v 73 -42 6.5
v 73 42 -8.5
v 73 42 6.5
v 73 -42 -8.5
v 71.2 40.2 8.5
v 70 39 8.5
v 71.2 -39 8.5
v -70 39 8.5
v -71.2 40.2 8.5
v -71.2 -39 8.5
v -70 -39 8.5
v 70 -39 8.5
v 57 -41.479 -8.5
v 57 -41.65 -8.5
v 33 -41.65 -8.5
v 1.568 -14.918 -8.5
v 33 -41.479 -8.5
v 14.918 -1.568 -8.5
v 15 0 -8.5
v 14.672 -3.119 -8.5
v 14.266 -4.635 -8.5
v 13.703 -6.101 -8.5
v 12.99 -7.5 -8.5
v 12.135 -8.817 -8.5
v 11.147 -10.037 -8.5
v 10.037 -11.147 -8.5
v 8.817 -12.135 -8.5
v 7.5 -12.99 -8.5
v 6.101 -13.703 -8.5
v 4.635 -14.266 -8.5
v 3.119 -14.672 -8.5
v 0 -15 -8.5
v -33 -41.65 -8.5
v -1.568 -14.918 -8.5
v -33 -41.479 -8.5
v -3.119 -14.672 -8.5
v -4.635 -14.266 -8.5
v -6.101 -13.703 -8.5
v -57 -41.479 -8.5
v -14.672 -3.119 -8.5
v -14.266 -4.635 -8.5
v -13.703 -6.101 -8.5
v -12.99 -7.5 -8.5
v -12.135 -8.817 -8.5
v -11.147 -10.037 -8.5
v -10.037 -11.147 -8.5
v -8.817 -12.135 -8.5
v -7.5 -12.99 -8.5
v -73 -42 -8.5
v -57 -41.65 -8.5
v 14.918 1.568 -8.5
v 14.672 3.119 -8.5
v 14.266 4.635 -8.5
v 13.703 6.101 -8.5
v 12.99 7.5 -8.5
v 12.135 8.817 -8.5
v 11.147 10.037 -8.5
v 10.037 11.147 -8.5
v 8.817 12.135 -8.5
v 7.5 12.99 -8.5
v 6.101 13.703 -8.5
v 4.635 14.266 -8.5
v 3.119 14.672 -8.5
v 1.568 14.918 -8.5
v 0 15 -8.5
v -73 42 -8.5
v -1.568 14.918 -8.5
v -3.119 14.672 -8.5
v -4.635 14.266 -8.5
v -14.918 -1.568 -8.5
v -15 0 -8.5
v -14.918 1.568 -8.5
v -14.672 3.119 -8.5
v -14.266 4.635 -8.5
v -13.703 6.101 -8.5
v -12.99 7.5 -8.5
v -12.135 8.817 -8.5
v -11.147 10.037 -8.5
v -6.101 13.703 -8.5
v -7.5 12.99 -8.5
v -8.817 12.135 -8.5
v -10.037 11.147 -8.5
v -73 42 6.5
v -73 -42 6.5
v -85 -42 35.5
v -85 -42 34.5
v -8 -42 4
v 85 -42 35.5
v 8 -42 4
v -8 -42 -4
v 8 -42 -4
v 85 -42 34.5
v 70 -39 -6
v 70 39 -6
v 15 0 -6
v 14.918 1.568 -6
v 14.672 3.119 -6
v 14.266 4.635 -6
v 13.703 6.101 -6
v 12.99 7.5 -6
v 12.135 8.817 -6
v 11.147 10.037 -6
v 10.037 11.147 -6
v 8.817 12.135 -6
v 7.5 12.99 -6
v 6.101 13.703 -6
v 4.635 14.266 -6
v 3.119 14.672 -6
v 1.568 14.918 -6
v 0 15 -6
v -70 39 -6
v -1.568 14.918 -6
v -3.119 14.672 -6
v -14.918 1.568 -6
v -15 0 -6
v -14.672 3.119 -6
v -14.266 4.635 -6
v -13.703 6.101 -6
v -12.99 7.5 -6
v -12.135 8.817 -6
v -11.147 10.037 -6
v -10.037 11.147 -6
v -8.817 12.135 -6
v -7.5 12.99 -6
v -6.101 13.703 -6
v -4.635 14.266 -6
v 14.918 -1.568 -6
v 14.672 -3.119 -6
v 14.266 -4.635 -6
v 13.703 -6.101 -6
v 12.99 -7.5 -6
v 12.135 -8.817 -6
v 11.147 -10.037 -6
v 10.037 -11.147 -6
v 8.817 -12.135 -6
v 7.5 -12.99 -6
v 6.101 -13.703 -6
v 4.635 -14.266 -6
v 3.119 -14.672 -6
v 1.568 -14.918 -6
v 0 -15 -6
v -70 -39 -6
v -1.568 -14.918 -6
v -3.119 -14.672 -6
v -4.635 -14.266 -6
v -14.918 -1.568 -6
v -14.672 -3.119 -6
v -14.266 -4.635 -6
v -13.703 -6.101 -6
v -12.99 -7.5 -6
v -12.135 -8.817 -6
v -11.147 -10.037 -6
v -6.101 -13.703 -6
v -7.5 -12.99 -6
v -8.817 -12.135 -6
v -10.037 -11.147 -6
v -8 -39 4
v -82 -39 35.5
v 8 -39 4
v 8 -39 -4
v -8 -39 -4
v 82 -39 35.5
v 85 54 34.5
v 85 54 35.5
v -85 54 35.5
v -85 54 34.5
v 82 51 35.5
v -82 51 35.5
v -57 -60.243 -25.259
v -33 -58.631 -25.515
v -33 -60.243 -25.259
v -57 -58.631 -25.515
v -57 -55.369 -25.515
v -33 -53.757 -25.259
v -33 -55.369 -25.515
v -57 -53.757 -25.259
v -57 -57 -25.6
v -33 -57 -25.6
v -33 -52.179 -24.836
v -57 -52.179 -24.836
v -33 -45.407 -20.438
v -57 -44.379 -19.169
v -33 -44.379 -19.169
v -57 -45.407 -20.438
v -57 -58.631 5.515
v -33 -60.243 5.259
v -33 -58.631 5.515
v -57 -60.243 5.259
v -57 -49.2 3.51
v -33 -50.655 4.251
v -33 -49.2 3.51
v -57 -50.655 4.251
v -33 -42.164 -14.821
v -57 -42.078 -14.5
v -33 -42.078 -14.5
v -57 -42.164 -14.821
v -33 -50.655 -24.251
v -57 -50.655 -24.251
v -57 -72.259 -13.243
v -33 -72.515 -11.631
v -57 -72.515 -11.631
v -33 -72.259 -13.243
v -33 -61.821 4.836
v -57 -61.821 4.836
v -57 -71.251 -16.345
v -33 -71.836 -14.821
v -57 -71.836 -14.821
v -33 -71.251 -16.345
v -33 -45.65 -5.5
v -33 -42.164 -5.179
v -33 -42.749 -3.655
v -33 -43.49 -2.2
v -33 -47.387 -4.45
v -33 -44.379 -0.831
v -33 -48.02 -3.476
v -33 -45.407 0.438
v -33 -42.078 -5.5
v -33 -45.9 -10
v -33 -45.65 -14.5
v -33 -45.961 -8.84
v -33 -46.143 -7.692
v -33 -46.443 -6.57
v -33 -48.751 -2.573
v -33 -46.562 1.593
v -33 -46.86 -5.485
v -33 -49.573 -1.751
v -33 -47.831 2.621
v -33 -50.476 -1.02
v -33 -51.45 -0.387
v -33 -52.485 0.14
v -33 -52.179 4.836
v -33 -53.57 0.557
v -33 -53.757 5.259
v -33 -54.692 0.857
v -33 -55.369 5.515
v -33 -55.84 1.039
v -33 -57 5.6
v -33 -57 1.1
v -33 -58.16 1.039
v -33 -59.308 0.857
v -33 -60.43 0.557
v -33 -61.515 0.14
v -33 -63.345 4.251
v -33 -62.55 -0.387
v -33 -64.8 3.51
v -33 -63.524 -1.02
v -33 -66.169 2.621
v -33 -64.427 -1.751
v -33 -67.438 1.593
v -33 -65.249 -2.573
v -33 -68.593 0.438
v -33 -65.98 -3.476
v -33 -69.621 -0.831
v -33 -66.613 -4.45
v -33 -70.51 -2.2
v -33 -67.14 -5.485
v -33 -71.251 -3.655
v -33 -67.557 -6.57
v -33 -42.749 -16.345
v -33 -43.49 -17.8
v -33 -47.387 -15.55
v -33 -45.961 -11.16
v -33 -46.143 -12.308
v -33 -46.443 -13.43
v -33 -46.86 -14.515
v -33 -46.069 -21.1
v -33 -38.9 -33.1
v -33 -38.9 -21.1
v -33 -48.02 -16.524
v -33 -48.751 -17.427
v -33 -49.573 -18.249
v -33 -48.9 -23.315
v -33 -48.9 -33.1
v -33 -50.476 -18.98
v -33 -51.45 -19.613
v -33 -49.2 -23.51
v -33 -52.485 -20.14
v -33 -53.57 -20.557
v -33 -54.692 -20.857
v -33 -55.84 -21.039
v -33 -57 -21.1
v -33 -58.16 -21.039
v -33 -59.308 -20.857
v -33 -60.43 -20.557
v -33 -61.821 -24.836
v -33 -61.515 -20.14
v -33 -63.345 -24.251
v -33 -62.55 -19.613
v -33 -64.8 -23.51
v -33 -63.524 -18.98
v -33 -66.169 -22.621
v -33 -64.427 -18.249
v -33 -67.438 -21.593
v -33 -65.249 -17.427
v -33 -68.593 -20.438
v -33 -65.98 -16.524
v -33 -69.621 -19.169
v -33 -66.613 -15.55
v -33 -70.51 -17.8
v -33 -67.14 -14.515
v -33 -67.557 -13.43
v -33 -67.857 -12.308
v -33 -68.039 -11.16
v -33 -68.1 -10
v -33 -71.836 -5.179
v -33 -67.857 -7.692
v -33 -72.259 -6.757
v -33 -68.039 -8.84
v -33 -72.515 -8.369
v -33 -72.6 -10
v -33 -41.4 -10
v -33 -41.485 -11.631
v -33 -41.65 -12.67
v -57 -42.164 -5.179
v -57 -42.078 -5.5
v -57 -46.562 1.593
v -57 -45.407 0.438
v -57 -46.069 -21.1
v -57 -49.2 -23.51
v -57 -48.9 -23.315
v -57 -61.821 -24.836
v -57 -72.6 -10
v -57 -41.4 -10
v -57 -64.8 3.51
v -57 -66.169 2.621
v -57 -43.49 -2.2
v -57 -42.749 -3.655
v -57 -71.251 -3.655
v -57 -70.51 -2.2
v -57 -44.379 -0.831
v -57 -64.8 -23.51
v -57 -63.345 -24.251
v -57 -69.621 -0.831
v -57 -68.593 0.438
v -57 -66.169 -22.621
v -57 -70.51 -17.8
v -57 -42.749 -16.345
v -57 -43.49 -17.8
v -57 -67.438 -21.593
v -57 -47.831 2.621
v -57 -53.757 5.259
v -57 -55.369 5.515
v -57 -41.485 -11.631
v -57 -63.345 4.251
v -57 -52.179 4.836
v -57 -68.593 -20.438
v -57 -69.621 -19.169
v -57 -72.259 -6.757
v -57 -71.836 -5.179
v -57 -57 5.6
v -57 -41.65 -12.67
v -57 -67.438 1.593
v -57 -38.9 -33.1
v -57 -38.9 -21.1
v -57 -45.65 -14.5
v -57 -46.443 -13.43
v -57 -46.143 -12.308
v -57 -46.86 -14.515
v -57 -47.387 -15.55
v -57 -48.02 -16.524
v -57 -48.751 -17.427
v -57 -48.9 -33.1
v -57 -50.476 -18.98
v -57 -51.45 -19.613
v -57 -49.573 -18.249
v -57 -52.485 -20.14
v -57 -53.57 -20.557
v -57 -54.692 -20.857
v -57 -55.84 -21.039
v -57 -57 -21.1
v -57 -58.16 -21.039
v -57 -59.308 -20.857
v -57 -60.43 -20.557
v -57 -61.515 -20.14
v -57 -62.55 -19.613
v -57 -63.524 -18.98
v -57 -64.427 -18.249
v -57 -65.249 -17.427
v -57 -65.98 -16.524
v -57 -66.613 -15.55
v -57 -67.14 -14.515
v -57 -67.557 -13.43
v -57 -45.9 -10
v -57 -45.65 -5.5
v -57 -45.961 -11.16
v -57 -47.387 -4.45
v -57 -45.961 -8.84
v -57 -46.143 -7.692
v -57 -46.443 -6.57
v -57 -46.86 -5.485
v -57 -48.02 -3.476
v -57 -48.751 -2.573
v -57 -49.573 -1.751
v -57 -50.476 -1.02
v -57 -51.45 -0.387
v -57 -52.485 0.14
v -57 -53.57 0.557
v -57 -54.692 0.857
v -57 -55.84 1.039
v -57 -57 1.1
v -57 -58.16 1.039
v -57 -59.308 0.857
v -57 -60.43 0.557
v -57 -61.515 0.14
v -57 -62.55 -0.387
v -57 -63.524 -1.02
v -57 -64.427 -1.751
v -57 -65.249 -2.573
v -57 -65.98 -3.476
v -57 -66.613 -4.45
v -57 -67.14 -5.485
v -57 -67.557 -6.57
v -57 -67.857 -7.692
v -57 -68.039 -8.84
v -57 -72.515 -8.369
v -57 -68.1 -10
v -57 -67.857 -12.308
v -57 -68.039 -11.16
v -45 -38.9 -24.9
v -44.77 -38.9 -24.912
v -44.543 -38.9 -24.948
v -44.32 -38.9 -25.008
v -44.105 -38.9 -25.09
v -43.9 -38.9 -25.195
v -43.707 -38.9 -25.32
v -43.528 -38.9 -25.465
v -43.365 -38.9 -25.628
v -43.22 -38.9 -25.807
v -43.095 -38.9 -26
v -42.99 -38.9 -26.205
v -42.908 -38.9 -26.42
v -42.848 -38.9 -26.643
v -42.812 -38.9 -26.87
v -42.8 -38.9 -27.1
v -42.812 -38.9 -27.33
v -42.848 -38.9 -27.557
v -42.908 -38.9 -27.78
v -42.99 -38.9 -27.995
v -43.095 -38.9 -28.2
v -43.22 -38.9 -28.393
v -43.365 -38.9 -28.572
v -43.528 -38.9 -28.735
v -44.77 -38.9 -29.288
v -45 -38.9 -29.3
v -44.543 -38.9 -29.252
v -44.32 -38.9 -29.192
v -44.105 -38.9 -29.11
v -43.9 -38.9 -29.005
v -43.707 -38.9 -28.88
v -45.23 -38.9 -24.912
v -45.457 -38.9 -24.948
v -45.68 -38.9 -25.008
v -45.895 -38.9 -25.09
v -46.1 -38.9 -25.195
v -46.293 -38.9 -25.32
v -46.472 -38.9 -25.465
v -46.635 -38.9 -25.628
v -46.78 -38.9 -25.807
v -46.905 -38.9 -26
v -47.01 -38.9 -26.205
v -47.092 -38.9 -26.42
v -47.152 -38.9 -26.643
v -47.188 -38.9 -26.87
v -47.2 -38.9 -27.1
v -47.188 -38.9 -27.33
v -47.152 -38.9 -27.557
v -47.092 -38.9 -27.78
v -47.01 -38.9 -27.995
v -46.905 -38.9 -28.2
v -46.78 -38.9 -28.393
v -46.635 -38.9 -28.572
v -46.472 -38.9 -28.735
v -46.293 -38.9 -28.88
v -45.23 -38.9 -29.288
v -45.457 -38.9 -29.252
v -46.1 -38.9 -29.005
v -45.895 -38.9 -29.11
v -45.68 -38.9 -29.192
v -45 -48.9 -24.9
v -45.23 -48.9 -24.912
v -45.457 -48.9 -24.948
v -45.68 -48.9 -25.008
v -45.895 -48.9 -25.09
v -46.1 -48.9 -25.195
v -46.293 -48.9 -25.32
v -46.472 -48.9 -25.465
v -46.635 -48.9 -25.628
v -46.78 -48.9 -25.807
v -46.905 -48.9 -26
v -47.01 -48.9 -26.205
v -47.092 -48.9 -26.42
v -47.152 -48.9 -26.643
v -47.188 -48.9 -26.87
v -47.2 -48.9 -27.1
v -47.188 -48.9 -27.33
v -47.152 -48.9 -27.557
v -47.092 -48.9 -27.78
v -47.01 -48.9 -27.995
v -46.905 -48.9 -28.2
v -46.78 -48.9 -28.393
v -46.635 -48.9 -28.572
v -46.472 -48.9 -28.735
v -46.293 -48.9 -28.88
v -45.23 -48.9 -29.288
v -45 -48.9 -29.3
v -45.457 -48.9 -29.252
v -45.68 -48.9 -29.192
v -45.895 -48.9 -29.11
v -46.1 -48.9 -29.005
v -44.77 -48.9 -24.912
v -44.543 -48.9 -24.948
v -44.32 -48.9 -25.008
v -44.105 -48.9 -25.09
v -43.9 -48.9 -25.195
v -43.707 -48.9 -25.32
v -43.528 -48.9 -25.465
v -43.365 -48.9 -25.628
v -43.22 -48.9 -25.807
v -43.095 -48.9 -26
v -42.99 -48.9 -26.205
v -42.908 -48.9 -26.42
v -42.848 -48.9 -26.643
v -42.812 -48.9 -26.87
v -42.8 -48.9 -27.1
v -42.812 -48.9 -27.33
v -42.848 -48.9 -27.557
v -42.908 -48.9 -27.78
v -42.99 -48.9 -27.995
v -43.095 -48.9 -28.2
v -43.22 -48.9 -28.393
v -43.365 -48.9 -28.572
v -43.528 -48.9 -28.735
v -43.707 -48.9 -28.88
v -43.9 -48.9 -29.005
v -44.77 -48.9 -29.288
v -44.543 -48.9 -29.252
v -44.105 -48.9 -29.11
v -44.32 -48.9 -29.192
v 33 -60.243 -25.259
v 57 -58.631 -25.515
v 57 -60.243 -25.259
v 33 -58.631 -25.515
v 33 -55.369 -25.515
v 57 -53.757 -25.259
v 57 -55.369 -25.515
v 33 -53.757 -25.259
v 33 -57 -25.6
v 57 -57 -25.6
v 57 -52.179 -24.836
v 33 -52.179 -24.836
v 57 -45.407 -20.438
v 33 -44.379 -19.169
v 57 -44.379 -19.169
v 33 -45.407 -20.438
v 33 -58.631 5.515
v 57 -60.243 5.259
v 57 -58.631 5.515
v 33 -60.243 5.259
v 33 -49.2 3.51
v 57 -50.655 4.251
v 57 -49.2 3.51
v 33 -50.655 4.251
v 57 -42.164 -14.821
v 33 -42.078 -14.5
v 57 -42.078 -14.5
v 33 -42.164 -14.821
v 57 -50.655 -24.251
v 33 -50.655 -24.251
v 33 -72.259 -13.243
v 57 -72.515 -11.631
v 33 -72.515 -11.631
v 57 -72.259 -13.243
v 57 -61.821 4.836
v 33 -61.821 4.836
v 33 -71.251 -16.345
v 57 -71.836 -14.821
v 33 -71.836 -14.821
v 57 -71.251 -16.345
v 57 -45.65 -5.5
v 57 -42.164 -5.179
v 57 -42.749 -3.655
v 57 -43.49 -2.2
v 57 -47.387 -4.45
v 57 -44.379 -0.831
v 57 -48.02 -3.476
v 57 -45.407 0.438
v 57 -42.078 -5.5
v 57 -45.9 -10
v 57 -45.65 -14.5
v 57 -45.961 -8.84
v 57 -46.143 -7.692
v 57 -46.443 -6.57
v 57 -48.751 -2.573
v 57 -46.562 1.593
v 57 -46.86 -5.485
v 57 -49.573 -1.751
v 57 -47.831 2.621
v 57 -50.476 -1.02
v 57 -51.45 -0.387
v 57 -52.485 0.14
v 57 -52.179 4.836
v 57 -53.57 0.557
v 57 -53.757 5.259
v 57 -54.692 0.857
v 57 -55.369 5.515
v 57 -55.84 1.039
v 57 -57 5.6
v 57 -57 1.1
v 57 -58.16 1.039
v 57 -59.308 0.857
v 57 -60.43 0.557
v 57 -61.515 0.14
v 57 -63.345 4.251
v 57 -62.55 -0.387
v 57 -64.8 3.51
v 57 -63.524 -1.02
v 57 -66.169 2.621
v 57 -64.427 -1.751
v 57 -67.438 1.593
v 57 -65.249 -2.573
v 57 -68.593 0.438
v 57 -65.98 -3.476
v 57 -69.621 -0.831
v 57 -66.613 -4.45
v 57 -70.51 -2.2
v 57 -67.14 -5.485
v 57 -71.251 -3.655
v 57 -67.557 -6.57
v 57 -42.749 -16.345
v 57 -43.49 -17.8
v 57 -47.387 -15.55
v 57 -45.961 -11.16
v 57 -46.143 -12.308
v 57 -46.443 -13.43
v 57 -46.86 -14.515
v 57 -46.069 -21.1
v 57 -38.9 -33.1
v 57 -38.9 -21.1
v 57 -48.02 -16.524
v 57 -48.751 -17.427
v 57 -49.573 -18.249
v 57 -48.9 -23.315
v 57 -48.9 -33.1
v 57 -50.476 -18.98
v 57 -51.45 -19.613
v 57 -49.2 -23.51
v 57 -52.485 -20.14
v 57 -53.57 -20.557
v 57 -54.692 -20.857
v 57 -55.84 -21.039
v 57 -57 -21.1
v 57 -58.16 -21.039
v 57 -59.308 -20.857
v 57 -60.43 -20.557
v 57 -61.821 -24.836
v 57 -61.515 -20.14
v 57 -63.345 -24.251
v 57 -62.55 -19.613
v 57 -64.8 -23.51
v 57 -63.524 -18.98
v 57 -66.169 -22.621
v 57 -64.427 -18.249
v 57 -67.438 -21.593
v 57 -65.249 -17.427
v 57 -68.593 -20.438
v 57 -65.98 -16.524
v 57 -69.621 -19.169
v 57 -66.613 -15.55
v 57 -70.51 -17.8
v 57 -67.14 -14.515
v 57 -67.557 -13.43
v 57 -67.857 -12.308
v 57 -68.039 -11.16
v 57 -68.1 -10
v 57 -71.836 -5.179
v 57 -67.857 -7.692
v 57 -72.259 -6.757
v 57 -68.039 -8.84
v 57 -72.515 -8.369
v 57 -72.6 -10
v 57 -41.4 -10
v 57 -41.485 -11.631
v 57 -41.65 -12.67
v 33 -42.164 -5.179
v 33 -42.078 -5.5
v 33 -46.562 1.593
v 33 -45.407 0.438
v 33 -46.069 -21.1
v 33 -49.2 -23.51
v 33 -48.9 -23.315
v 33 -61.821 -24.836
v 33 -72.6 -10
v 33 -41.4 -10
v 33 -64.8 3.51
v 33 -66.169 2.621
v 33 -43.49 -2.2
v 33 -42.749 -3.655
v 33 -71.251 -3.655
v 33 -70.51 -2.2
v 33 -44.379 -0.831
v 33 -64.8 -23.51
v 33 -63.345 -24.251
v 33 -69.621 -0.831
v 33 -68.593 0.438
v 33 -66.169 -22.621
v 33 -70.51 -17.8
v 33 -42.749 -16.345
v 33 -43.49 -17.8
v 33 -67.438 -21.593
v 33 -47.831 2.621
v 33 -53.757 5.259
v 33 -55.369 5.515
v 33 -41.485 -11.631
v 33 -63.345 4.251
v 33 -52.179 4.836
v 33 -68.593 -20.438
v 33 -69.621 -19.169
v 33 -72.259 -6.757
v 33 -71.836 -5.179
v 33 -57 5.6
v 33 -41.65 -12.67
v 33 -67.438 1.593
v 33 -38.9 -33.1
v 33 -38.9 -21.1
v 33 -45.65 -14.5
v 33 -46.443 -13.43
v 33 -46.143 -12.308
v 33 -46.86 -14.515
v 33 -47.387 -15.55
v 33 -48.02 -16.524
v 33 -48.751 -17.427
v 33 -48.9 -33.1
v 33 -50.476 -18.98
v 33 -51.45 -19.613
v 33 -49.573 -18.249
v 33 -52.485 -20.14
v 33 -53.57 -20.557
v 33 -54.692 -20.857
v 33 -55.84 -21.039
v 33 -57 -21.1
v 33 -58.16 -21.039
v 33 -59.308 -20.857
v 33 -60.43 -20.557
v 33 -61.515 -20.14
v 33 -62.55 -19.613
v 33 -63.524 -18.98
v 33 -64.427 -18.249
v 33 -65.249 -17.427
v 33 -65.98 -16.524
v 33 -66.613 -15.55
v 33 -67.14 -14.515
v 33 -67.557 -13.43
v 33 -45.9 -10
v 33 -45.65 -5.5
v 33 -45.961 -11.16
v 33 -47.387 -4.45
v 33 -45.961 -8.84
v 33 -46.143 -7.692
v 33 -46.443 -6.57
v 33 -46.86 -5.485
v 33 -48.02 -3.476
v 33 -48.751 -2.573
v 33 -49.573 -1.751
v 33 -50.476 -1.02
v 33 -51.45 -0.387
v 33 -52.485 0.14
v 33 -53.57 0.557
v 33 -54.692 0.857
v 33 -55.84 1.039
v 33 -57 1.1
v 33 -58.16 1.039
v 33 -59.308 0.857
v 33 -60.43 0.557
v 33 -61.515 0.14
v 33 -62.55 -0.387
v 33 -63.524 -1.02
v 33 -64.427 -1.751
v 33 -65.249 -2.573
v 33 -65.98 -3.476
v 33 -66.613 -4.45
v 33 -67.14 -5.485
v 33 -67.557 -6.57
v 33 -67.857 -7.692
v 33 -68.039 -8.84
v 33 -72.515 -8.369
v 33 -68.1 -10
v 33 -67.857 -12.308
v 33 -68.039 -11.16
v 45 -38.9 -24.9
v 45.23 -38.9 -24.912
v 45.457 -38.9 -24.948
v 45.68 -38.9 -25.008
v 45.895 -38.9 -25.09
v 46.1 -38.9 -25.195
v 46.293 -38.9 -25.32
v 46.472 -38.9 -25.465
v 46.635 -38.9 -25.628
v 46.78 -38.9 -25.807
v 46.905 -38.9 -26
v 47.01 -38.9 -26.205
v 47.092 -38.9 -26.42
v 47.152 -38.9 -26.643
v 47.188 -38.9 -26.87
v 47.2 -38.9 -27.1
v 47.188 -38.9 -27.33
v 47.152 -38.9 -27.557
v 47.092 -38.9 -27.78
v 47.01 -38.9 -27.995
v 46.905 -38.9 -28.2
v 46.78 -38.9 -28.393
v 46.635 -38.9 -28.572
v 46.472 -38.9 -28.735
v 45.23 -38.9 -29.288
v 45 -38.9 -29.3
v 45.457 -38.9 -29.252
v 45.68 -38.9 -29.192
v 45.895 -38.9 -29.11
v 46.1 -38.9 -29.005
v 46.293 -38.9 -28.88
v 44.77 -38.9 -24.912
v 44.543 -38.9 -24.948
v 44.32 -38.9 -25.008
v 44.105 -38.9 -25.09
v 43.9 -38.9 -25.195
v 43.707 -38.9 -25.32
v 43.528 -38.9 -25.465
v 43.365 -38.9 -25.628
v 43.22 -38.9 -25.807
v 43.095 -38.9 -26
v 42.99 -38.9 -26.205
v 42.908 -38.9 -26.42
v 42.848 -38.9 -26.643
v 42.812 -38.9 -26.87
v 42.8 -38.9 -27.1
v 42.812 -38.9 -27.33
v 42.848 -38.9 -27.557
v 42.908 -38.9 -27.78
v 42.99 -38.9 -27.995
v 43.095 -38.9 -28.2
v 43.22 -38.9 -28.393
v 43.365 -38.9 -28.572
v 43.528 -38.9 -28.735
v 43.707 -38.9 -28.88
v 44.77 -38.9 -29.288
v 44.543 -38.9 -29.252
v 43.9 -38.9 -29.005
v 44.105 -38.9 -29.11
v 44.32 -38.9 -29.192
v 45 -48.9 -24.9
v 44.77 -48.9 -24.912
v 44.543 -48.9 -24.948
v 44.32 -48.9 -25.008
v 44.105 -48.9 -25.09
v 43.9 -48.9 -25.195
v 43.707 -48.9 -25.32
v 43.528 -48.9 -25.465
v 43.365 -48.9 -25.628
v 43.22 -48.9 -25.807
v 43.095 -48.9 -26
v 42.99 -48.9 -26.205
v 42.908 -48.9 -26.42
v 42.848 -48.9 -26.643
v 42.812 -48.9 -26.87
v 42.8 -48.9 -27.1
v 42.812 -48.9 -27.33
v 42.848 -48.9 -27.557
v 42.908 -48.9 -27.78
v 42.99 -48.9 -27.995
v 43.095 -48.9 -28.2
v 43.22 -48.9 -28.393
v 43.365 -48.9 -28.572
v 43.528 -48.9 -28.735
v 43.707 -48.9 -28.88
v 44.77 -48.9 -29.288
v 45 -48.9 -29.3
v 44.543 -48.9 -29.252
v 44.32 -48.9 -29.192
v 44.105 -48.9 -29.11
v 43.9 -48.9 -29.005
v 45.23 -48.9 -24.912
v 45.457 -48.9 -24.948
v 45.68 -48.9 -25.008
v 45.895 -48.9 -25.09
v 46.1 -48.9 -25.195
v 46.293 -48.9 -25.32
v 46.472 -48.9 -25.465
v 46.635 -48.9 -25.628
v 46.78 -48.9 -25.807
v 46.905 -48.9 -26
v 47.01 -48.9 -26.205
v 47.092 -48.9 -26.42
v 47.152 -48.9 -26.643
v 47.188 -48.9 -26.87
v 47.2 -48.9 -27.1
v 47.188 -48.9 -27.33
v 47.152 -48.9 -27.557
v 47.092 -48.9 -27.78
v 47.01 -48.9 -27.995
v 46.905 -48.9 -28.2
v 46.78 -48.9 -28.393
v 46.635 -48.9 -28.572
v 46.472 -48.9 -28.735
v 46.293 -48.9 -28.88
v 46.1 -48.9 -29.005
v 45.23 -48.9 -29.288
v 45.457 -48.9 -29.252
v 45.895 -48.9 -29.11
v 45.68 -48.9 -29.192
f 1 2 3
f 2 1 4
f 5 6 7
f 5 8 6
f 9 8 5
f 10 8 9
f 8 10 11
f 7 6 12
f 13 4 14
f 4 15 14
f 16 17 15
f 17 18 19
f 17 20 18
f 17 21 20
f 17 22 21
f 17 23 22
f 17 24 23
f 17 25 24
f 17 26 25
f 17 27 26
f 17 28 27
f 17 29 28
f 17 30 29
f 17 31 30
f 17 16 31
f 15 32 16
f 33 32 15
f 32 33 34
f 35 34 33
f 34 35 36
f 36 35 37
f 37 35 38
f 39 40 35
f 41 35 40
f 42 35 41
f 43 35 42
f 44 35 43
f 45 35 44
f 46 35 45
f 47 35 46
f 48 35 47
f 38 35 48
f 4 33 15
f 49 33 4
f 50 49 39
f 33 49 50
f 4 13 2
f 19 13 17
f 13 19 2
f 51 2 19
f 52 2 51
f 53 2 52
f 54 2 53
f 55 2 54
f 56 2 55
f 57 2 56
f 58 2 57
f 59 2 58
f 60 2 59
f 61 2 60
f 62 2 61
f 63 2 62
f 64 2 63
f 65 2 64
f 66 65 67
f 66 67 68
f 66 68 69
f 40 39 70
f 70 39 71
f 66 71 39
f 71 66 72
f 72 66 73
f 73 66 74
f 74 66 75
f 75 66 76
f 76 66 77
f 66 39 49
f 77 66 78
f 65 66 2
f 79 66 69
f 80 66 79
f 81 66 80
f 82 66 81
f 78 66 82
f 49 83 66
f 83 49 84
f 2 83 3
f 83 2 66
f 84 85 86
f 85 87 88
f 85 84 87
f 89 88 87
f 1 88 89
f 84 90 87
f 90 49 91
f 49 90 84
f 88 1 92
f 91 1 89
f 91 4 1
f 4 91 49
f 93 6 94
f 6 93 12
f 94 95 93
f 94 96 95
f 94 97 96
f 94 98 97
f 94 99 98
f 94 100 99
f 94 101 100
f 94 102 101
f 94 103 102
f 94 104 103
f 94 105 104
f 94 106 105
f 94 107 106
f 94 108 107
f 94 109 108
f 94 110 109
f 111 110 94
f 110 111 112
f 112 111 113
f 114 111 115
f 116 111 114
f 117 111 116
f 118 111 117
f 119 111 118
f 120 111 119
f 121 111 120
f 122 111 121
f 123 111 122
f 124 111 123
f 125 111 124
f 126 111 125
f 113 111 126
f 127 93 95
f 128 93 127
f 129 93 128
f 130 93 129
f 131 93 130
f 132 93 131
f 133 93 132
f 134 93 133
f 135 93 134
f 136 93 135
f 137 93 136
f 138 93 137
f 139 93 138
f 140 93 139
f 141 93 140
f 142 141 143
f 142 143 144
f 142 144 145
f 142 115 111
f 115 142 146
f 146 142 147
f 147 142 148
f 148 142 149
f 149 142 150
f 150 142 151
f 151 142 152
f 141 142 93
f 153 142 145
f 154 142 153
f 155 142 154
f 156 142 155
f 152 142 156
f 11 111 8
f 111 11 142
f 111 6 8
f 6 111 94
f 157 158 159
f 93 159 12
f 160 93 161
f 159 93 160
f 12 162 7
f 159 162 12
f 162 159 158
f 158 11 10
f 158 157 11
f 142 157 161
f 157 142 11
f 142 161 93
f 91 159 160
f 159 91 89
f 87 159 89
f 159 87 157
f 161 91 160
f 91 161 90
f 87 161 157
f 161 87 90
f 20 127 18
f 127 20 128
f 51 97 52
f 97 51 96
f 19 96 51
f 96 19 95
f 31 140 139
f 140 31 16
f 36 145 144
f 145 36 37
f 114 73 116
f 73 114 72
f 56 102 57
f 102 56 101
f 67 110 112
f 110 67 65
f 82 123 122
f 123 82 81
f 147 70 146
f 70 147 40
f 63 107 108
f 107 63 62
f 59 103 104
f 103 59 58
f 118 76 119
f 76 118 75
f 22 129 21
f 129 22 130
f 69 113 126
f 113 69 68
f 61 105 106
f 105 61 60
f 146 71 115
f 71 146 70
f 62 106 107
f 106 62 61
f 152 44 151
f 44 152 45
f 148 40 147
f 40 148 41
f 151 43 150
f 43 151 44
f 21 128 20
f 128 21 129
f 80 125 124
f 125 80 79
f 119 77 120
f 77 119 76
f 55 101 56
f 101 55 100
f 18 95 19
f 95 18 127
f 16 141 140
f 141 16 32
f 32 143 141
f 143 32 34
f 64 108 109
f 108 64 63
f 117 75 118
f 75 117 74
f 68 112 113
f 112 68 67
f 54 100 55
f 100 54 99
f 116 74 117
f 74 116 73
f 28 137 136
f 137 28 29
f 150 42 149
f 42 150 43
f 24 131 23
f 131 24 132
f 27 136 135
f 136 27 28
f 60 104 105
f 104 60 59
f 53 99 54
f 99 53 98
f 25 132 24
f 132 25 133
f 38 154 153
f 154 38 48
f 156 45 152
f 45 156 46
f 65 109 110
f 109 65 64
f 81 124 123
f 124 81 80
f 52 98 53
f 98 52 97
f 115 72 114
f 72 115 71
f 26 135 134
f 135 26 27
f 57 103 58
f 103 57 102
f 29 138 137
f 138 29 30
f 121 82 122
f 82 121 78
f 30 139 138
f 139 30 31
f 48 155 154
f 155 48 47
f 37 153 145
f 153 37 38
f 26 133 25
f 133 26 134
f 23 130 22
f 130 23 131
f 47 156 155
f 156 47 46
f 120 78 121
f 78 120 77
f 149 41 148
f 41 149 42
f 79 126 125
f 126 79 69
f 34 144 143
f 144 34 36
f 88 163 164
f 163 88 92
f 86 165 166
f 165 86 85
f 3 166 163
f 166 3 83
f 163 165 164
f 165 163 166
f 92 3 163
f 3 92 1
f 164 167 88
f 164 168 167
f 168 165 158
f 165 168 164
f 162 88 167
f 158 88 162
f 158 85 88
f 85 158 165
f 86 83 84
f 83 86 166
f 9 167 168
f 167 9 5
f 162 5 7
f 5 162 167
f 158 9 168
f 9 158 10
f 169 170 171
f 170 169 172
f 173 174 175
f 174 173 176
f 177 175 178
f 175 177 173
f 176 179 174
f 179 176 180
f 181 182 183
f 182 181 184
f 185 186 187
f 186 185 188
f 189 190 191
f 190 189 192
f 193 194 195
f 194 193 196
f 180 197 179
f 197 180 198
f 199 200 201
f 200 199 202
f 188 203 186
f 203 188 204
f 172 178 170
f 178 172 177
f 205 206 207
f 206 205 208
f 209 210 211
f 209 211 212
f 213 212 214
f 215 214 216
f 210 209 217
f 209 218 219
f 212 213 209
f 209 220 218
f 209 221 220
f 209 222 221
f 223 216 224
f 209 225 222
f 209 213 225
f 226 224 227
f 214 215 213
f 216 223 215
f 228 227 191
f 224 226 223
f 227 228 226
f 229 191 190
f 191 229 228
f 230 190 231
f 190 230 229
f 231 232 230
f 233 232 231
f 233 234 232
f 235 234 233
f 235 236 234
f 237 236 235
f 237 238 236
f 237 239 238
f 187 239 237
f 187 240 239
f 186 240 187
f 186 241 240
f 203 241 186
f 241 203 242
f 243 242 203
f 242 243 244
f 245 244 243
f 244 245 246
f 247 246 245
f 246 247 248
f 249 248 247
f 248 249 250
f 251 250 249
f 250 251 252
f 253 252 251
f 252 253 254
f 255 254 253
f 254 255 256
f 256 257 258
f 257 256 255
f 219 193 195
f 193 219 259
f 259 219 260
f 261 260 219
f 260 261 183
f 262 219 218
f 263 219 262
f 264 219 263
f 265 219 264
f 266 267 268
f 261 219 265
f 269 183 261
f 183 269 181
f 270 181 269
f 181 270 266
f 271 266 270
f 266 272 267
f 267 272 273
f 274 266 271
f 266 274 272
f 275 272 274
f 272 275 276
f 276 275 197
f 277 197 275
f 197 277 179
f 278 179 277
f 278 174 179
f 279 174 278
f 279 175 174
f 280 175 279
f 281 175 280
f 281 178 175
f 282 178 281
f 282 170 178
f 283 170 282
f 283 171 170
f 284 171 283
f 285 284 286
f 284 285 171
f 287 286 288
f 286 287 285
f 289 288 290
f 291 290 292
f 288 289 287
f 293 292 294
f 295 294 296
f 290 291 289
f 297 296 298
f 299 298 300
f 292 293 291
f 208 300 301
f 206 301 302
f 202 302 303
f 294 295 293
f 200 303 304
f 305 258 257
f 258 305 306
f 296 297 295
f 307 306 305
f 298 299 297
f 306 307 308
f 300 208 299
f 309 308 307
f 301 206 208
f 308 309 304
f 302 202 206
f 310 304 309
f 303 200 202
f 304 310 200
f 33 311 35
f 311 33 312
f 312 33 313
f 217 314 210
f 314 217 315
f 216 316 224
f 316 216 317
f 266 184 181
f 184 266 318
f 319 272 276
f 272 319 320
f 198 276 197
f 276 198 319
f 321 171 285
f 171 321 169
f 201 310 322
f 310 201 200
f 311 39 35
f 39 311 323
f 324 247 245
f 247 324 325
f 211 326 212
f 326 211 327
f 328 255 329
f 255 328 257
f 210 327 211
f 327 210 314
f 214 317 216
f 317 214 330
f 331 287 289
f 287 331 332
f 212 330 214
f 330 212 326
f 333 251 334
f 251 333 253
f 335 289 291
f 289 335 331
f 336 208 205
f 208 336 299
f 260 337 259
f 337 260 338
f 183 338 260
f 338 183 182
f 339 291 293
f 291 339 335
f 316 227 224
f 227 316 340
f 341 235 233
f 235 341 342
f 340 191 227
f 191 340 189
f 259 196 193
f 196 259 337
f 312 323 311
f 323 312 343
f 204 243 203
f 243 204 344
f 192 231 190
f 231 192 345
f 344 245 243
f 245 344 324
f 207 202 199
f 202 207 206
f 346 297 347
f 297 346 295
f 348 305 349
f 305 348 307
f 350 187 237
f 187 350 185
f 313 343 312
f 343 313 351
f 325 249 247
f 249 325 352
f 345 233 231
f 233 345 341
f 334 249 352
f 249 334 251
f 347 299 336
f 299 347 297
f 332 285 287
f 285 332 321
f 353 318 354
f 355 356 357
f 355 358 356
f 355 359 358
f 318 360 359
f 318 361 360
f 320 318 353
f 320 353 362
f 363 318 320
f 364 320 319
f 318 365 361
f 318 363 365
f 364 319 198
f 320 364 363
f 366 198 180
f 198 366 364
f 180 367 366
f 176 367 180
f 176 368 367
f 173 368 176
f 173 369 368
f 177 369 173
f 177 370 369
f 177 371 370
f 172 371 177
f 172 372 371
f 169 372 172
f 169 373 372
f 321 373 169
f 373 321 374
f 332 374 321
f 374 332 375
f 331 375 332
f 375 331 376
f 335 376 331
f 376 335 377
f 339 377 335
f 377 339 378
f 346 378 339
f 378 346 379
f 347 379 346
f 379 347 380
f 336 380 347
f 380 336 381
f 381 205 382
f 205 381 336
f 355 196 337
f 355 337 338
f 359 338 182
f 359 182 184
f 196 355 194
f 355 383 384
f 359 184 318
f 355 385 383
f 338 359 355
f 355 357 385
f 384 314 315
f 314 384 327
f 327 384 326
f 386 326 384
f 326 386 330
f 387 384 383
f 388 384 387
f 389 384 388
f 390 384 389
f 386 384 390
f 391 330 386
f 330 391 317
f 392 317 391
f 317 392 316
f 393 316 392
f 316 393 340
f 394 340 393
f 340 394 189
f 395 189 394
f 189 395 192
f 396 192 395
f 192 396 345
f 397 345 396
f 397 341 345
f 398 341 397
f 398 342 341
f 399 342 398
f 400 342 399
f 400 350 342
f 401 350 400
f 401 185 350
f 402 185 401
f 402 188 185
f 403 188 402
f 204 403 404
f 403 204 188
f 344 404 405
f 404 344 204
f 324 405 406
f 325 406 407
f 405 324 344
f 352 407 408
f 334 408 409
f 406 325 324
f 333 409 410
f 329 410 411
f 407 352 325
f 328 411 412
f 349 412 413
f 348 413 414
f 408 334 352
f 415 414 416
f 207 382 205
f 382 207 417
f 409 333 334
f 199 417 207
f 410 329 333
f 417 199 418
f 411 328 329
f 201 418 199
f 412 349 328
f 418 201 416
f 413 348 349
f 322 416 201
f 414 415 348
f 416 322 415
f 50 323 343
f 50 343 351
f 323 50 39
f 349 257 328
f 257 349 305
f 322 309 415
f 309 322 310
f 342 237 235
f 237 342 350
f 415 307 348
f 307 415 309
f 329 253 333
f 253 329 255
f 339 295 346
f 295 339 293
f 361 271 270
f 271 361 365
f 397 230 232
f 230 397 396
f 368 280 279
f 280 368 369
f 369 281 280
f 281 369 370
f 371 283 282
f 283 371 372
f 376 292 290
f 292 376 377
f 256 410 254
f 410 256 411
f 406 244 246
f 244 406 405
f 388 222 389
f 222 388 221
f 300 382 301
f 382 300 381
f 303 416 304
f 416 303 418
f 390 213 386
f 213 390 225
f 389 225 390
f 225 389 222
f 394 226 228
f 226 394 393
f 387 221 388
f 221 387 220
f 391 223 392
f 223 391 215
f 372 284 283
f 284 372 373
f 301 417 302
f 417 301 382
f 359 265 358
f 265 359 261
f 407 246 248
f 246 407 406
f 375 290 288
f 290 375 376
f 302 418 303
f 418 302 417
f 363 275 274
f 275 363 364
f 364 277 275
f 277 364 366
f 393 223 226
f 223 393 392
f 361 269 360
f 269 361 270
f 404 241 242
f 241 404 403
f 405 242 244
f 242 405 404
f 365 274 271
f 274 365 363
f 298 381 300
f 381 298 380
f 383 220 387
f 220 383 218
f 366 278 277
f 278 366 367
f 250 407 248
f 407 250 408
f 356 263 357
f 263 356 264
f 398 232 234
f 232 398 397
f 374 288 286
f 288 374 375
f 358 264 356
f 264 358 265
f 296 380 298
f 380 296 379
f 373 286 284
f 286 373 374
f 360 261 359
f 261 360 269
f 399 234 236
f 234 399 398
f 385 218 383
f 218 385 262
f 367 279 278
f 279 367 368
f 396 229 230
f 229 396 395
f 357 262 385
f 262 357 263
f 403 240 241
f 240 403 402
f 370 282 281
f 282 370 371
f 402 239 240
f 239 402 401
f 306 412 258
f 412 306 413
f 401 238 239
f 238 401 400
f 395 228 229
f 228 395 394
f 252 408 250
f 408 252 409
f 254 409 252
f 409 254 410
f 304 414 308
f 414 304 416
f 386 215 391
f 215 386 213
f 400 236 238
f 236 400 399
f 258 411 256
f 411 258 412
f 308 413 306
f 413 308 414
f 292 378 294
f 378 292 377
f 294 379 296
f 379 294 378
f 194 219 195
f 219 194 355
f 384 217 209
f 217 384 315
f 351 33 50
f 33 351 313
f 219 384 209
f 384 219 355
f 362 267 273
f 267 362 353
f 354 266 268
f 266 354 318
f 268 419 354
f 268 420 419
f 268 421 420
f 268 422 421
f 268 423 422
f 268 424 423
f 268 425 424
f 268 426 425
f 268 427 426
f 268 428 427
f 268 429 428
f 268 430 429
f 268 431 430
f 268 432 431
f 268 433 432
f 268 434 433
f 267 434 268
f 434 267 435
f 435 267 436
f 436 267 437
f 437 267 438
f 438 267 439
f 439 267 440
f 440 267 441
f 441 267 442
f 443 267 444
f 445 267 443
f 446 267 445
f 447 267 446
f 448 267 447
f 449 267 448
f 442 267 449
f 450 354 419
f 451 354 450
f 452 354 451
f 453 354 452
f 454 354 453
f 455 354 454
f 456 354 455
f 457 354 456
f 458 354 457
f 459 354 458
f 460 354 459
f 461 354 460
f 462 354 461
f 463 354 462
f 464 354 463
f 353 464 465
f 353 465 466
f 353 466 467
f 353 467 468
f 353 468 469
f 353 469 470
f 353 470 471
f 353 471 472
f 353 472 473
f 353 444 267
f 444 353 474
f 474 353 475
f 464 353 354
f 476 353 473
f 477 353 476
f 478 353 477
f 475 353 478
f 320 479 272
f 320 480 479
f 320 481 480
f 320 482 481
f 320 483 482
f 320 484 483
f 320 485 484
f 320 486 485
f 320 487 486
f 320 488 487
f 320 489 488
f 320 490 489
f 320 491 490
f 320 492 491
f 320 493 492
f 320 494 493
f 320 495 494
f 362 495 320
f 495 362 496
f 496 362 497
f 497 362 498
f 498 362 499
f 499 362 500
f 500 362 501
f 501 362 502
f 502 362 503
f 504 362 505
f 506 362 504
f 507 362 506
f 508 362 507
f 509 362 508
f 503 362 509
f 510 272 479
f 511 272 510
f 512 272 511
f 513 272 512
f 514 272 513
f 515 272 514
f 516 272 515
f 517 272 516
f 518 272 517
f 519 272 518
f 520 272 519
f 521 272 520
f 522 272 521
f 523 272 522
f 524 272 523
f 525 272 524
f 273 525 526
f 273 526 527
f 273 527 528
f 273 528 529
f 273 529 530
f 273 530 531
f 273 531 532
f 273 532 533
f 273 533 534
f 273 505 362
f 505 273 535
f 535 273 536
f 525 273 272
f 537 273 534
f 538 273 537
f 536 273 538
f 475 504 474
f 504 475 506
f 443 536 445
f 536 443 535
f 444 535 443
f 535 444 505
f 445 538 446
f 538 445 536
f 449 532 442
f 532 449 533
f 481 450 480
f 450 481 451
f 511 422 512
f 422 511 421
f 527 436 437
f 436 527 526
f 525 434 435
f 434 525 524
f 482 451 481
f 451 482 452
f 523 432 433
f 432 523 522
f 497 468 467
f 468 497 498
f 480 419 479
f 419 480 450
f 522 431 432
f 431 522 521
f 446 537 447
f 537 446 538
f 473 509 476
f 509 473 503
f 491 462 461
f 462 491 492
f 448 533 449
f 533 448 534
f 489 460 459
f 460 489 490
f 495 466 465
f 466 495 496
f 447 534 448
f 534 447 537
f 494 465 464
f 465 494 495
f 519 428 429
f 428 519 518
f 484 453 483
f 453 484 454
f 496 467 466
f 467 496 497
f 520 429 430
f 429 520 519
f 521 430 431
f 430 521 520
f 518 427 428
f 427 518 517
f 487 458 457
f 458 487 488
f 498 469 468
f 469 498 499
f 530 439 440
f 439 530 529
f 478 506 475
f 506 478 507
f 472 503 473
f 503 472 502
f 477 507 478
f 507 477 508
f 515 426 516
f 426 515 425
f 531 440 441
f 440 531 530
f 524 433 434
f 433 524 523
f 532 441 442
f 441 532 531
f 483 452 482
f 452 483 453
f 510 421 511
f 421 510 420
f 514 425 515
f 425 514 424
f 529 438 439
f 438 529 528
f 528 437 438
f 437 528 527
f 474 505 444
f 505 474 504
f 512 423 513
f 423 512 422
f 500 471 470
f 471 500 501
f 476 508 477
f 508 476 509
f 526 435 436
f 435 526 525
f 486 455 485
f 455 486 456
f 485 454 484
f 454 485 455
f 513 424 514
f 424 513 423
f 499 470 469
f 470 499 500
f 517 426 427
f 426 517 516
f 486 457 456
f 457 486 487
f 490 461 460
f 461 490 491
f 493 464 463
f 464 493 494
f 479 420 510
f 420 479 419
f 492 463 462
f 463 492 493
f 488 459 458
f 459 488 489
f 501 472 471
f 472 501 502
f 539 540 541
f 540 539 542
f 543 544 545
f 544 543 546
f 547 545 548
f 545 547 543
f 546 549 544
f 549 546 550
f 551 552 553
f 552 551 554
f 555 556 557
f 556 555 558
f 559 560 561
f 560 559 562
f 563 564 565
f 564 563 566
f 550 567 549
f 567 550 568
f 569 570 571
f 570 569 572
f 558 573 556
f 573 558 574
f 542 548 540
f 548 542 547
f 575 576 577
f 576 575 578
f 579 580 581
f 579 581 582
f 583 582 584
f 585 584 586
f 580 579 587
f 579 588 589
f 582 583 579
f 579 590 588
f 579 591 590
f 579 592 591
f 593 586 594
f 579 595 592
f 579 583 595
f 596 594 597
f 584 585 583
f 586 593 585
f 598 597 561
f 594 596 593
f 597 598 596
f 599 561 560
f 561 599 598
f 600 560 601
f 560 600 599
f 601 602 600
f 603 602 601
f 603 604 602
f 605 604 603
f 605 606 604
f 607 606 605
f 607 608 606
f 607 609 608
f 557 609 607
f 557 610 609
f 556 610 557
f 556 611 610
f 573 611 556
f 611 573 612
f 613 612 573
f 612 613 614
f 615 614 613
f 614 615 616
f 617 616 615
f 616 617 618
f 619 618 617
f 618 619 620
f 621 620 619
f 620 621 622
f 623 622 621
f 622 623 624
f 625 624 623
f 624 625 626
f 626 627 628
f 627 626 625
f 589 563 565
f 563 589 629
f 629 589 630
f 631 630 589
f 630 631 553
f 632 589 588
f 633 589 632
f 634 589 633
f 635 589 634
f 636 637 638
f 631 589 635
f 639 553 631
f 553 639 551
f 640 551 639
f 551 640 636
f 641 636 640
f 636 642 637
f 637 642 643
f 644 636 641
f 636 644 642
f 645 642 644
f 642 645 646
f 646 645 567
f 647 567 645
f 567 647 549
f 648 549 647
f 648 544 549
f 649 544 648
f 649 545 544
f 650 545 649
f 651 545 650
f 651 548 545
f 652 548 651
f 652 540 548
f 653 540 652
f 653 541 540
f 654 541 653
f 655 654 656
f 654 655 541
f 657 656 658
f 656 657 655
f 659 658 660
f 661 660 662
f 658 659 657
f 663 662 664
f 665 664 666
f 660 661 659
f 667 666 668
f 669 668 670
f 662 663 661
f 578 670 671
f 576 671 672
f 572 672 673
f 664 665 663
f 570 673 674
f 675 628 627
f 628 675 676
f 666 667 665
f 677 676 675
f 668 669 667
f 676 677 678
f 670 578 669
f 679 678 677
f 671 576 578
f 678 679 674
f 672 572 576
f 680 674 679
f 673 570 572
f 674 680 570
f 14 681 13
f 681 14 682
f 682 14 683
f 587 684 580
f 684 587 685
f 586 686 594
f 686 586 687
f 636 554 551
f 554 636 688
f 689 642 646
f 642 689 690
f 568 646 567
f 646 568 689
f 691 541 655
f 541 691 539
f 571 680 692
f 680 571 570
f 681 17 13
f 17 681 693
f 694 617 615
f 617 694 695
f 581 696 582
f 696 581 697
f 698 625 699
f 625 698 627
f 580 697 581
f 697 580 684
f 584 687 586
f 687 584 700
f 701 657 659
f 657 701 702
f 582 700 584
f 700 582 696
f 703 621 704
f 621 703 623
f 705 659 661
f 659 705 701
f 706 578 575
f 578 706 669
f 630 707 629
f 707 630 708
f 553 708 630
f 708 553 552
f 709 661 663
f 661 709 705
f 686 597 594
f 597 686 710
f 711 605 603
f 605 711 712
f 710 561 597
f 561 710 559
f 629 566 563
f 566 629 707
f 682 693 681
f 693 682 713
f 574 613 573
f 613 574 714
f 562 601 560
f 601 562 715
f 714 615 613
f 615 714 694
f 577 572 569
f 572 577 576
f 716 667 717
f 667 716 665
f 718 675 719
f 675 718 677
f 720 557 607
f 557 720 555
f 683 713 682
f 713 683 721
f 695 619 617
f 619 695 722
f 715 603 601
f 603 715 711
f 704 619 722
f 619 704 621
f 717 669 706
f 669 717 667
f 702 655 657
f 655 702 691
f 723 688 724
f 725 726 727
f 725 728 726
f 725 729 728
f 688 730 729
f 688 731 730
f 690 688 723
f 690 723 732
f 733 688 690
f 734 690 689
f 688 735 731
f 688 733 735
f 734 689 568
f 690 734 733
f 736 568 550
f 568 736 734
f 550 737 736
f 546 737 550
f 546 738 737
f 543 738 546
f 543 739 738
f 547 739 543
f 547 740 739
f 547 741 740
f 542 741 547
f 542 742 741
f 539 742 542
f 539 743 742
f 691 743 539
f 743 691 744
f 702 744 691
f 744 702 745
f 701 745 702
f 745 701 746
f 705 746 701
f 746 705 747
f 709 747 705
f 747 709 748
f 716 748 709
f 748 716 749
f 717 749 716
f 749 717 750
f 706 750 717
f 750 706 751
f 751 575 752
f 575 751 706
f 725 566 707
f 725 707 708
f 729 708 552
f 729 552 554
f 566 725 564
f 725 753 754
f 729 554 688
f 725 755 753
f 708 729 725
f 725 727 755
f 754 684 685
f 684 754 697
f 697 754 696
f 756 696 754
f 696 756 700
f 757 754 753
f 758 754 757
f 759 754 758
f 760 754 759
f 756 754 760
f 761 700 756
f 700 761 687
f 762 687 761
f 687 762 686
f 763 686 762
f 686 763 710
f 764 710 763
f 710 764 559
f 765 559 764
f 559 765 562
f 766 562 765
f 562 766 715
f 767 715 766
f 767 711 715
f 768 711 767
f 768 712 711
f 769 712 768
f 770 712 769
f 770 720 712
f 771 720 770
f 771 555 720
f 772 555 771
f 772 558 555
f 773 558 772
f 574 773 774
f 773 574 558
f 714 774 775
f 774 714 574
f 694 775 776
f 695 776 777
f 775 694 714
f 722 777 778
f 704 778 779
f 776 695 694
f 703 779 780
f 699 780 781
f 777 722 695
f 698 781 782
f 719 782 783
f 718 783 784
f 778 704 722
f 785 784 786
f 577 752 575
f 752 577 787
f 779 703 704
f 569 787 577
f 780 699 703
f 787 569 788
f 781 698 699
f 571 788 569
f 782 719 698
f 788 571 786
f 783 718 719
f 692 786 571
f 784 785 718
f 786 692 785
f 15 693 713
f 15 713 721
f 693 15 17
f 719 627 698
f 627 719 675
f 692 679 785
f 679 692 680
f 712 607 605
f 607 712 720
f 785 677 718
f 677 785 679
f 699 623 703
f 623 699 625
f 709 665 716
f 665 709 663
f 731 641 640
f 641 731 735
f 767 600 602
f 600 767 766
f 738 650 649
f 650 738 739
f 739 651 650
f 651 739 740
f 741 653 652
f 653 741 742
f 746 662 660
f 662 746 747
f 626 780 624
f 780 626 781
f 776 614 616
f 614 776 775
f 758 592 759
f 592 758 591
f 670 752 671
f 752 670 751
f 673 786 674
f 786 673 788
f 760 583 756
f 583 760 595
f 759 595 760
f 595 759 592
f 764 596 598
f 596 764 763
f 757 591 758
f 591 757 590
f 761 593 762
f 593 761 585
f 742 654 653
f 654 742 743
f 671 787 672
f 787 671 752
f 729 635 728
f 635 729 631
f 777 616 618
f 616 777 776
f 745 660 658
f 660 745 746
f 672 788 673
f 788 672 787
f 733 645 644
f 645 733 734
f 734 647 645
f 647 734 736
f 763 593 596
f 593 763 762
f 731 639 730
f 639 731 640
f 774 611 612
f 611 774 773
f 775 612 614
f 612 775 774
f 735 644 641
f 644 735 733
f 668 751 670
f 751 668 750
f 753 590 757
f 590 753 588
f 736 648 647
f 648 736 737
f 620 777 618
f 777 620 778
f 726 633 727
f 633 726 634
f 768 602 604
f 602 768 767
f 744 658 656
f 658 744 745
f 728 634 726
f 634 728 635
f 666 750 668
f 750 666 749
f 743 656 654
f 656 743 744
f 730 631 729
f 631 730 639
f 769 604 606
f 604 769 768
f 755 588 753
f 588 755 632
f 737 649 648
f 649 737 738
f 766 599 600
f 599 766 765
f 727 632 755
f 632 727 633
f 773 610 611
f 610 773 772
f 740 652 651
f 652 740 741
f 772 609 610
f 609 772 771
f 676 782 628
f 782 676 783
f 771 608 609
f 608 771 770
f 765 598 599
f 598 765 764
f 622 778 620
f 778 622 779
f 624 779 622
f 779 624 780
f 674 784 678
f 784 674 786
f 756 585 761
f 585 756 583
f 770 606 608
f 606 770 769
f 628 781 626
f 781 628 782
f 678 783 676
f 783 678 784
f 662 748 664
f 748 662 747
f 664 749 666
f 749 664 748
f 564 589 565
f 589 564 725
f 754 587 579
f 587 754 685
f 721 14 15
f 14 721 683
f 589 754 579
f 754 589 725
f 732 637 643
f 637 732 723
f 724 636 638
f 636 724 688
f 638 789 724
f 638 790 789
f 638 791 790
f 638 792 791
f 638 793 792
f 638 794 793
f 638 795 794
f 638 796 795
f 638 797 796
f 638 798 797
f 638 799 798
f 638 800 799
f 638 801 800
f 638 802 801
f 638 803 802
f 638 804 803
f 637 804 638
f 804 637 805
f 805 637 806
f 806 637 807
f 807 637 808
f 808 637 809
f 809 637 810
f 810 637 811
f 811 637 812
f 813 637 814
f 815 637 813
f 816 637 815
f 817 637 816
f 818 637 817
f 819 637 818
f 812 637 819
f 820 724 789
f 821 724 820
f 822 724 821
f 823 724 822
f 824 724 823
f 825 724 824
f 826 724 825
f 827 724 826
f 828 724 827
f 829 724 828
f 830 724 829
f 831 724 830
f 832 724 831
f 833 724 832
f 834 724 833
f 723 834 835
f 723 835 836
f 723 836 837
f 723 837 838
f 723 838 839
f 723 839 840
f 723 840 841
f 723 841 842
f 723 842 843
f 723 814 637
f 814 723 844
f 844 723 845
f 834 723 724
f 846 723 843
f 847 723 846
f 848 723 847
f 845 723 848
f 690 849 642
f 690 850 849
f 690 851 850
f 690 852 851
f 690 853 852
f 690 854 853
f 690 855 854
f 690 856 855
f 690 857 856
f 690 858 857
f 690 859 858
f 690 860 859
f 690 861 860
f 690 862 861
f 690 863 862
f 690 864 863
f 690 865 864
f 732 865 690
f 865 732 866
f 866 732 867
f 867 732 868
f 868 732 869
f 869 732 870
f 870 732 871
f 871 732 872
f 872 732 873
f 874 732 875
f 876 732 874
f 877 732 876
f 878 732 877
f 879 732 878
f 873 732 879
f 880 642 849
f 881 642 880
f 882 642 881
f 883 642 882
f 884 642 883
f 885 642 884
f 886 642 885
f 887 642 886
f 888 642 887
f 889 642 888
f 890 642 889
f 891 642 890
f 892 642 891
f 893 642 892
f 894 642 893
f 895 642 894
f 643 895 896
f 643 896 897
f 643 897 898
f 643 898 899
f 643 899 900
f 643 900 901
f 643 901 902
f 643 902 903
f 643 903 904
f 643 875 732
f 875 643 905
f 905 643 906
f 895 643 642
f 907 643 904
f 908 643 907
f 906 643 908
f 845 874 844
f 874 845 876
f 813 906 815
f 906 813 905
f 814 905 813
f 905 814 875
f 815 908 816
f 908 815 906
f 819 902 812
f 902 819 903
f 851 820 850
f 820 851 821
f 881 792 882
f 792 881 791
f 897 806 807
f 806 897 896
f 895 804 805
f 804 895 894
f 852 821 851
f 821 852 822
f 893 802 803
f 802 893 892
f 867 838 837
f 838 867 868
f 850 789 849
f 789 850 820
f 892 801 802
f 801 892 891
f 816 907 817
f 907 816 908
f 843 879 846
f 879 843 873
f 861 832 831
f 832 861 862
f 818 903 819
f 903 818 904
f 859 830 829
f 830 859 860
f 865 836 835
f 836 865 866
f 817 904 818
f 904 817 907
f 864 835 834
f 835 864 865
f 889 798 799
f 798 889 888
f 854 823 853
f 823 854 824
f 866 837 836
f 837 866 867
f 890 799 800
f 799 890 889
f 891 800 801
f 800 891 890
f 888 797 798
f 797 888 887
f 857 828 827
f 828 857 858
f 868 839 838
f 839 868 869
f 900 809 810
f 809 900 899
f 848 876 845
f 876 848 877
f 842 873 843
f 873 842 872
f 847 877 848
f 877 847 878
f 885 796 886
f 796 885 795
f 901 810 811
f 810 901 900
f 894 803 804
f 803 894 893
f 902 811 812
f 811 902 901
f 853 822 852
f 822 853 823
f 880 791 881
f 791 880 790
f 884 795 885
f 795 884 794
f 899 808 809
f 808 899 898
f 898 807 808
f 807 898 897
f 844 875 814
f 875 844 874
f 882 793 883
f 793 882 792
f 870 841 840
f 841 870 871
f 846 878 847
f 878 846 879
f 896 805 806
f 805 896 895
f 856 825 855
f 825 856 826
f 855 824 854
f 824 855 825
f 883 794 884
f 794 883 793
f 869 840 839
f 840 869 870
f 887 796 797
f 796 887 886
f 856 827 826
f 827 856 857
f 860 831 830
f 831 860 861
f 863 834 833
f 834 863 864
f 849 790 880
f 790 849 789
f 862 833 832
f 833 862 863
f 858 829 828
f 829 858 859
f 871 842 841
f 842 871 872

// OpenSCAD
// Indriyo (ইন্দ্রিয়) - Parametric Motorcycle Handlebar Display & Sun Hood
// Designed for OpenSCAD / FDM 3D Printing (PETG/ABS Recommended)

$fn = 60; // Smooth curves

// --- PARAMETERS ---
bar_diameter = 22.2;       // Standard 7/8" (22.2mm) handlebar (or 28.6mm for fatbars)
clamp_width = 24.0;        // Width of bar clamp
clamp_thickness = 4.5;     // Thickness of clamp band
display_width = 140.0;     // Accommodates up to 6.1" smartphone or 5" LCD display
display_height = 78.0;     // Display internal height
display_depth = 14.0;      // Device slot thickness
visor_depth = 28.0;        // Anti-glare sun hood extension length
visor_flare = 12.0;        // Outward visor angle flare
wall_thickness = 3.0;      // Enclosure wall thickness
cable_slot_w = 16.0;       // USB-C pass-through slot width
cable_slot_h = 8.0;        // USB-C pass-through slot height

module handlebar_clamp() {
    difference() {
        cylinder(r = (bar_diameter/2) + clamp_thickness, h = clamp_width, center = true);
        cylinder(r = bar_diameter/2, h = clamp_width + 1, center = true);
        // Clamp slit
        translate([0, (bar_diameter/2) + clamp_thickness/2, 0])
            cube([clamp_thickness * 2, 4, clamp_width + 2], center = true);
    }
    // Bolt tabs
    translate([(bar_diameter/2) + 6, (bar_diameter/2) + 2, 0])
        difference() {
            cube([12, 10, clamp_width], center = true);
            // M4 bolt hole
            rotate([90, 0, 0]) cylinder(r = 2.2, h = 14, center = true);
        }
}

module display_cradle() {
    difference() {
        // Outer housing shell
        cube([
            display_width + (wall_thickness * 2),
            display_height + (wall_thickness * 2),
            display_depth + wall_thickness
        ], center = true);

        // Internal device pocket
        translate([0, 0, wall_thickness / 2])
            cube([display_width, display_height, display_depth + 1], center = true);

        // USB-C Bottom charging / telemetry cable port
        translate([0, -(display_height/2 + wall_thickness/2), 0])
            cube([cable_slot_w, wall_thickness * 2, cable_slot_h], center = true);
            
        // Finger push-out slot for easy phone removal
        cylinder(r = 15, h = display_depth * 2, center = true);
    }
}

module sun_visor() {
    // 4-sided tapered glare-shield hood
    difference() {
        hull() {
            // Base matching cradle rim
            translate([0, 0, display_depth/2])
                cube([display_width + (wall_thickness * 2), display_height + (wall_thickness * 2), 1], center = true);
            // Flared front rim
            translate([0, visor_flare / 2, display_depth/2 + visor_depth])
                cube([display_width + (wall_thickness * 2) + (visor_flare * 2), display_height + (wall_thickness * 2) + visor_flare, 1], center = true);
        }
        hull() {
            // Cutout interior
            translate([0, 0, display_depth/2 - 1])
                cube([display_width, display_height, 1], center = true);
            translate([0, visor_flare / 2, display_depth/2 + visor_depth + 1])
                cube([display_width + (visor_flare * 2), display_height + visor_flare, 1], center = true);
        }
    }
}

// Complete Assembled Model
module full_assembly() {
    // Main Display Cradle & Sun Visor
    display_cradle();
    sun_visor();

    // Dual Bar Clamps (Left and Right for rigidity)
    translate([-45, -display_height/2 - 18, -10])
        rotate([0, 90, 0])
            handlebar_clamp();

    translate([45, -display_height/2 - 18, -10])
        rotate([0, 90, 0])
            handlebar_clamp();
}

full_assembly();
